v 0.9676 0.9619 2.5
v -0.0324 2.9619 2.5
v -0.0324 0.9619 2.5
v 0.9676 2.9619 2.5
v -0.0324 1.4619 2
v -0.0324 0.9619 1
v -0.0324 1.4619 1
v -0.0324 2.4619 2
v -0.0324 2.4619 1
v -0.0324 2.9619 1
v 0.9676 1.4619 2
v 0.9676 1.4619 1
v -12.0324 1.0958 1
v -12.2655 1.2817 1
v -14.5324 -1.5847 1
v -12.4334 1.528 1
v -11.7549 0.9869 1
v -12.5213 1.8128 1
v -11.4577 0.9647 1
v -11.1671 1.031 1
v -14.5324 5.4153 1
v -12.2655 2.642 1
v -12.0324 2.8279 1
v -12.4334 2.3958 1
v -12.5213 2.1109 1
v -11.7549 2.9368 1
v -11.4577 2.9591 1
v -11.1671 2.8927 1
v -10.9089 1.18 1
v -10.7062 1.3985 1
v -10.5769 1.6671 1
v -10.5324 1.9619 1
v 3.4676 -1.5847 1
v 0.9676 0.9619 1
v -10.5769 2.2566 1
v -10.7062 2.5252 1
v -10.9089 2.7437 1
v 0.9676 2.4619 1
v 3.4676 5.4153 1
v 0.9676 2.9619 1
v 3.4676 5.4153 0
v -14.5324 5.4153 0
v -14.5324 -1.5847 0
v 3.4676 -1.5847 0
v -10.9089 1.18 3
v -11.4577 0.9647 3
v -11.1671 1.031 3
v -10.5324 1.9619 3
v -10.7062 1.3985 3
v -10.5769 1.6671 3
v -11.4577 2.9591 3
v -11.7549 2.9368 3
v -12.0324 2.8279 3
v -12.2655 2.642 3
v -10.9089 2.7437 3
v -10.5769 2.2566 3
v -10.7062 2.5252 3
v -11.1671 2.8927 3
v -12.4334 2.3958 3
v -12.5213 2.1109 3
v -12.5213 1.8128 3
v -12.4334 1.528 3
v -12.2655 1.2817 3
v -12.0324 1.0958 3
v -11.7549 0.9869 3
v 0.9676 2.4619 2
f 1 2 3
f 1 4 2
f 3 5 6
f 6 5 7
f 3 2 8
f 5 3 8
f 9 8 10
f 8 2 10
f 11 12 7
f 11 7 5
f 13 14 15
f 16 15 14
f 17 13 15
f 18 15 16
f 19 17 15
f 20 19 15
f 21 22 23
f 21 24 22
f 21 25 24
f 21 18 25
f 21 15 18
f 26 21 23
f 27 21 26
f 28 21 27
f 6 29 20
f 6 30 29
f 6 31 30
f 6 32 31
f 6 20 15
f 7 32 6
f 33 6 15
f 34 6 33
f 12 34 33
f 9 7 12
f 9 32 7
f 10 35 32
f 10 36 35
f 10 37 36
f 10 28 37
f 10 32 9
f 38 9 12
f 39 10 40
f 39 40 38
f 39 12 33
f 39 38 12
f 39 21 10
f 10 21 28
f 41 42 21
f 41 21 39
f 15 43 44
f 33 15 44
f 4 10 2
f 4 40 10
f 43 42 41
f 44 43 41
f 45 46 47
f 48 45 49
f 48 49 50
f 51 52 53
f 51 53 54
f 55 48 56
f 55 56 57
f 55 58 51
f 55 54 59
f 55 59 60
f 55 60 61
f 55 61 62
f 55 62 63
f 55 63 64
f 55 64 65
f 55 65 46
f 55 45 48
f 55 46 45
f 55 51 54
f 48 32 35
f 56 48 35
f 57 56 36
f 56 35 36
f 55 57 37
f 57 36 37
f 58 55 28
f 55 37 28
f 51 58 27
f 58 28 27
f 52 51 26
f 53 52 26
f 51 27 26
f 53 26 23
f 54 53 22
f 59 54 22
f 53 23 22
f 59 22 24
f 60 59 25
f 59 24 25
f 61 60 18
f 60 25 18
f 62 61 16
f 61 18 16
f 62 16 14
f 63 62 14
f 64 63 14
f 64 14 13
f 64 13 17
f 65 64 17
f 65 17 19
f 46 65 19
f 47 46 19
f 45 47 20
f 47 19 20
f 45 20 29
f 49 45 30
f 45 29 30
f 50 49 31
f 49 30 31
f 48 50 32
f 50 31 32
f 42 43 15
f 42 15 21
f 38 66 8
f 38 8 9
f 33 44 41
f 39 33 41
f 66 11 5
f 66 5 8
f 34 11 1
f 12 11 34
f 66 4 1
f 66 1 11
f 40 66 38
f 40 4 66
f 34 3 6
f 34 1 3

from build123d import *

# Parameters (mm, degrees)
SKETCH_1_W      = 18
SKETCH_1_H      = 7
EXTRUDE_1_DEPTH = 1
SKETCH_3_R      = 1
EXTRUDE_2_DEPTH = 2
EXTRUDE_4_DEPTH = 0.5


with BuildPart() as part:
    # 草图1 → 凸台-拉伸1 (new body)
    with BuildSketch(Plane.XY):
        with Locations((-5.532426778, 1.915271967)):
            Rectangle(SKETCH_1_W, SKETCH_1_H)
    extrude(amount=EXTRUDE_1_DEPTH)

    # 草图3 → 凸台-拉伸2 (add)
    with BuildSketch(Plane.XY.offset(1)):
        with Locations((-11.532426778, 1.961868549)):
            Circle(SKETCH_3_R)
    extrude(amount=EXTRUDE_2_DEPTH)

    # 草图7 → 凸台-拉伸4 (add, symmetric)
    with BuildSketch(Plane(origin=(0.467573222, 0, 0), x_dir=(0, 0, -1), z_dir=(1, 0, 0))):
        Polygon((-2.5, 0.961868549), (-1, 0.961868549), (-1, 1.461868549), (-2, 1.461868549), (-2, 2.461868549), (-1, 2.461868549), (-1, 2.961868549), (-2.5, 2.961868549), align=None)
    extrude(amount=EXTRUDE_4_DEPTH, both=True)


solid = part.part
